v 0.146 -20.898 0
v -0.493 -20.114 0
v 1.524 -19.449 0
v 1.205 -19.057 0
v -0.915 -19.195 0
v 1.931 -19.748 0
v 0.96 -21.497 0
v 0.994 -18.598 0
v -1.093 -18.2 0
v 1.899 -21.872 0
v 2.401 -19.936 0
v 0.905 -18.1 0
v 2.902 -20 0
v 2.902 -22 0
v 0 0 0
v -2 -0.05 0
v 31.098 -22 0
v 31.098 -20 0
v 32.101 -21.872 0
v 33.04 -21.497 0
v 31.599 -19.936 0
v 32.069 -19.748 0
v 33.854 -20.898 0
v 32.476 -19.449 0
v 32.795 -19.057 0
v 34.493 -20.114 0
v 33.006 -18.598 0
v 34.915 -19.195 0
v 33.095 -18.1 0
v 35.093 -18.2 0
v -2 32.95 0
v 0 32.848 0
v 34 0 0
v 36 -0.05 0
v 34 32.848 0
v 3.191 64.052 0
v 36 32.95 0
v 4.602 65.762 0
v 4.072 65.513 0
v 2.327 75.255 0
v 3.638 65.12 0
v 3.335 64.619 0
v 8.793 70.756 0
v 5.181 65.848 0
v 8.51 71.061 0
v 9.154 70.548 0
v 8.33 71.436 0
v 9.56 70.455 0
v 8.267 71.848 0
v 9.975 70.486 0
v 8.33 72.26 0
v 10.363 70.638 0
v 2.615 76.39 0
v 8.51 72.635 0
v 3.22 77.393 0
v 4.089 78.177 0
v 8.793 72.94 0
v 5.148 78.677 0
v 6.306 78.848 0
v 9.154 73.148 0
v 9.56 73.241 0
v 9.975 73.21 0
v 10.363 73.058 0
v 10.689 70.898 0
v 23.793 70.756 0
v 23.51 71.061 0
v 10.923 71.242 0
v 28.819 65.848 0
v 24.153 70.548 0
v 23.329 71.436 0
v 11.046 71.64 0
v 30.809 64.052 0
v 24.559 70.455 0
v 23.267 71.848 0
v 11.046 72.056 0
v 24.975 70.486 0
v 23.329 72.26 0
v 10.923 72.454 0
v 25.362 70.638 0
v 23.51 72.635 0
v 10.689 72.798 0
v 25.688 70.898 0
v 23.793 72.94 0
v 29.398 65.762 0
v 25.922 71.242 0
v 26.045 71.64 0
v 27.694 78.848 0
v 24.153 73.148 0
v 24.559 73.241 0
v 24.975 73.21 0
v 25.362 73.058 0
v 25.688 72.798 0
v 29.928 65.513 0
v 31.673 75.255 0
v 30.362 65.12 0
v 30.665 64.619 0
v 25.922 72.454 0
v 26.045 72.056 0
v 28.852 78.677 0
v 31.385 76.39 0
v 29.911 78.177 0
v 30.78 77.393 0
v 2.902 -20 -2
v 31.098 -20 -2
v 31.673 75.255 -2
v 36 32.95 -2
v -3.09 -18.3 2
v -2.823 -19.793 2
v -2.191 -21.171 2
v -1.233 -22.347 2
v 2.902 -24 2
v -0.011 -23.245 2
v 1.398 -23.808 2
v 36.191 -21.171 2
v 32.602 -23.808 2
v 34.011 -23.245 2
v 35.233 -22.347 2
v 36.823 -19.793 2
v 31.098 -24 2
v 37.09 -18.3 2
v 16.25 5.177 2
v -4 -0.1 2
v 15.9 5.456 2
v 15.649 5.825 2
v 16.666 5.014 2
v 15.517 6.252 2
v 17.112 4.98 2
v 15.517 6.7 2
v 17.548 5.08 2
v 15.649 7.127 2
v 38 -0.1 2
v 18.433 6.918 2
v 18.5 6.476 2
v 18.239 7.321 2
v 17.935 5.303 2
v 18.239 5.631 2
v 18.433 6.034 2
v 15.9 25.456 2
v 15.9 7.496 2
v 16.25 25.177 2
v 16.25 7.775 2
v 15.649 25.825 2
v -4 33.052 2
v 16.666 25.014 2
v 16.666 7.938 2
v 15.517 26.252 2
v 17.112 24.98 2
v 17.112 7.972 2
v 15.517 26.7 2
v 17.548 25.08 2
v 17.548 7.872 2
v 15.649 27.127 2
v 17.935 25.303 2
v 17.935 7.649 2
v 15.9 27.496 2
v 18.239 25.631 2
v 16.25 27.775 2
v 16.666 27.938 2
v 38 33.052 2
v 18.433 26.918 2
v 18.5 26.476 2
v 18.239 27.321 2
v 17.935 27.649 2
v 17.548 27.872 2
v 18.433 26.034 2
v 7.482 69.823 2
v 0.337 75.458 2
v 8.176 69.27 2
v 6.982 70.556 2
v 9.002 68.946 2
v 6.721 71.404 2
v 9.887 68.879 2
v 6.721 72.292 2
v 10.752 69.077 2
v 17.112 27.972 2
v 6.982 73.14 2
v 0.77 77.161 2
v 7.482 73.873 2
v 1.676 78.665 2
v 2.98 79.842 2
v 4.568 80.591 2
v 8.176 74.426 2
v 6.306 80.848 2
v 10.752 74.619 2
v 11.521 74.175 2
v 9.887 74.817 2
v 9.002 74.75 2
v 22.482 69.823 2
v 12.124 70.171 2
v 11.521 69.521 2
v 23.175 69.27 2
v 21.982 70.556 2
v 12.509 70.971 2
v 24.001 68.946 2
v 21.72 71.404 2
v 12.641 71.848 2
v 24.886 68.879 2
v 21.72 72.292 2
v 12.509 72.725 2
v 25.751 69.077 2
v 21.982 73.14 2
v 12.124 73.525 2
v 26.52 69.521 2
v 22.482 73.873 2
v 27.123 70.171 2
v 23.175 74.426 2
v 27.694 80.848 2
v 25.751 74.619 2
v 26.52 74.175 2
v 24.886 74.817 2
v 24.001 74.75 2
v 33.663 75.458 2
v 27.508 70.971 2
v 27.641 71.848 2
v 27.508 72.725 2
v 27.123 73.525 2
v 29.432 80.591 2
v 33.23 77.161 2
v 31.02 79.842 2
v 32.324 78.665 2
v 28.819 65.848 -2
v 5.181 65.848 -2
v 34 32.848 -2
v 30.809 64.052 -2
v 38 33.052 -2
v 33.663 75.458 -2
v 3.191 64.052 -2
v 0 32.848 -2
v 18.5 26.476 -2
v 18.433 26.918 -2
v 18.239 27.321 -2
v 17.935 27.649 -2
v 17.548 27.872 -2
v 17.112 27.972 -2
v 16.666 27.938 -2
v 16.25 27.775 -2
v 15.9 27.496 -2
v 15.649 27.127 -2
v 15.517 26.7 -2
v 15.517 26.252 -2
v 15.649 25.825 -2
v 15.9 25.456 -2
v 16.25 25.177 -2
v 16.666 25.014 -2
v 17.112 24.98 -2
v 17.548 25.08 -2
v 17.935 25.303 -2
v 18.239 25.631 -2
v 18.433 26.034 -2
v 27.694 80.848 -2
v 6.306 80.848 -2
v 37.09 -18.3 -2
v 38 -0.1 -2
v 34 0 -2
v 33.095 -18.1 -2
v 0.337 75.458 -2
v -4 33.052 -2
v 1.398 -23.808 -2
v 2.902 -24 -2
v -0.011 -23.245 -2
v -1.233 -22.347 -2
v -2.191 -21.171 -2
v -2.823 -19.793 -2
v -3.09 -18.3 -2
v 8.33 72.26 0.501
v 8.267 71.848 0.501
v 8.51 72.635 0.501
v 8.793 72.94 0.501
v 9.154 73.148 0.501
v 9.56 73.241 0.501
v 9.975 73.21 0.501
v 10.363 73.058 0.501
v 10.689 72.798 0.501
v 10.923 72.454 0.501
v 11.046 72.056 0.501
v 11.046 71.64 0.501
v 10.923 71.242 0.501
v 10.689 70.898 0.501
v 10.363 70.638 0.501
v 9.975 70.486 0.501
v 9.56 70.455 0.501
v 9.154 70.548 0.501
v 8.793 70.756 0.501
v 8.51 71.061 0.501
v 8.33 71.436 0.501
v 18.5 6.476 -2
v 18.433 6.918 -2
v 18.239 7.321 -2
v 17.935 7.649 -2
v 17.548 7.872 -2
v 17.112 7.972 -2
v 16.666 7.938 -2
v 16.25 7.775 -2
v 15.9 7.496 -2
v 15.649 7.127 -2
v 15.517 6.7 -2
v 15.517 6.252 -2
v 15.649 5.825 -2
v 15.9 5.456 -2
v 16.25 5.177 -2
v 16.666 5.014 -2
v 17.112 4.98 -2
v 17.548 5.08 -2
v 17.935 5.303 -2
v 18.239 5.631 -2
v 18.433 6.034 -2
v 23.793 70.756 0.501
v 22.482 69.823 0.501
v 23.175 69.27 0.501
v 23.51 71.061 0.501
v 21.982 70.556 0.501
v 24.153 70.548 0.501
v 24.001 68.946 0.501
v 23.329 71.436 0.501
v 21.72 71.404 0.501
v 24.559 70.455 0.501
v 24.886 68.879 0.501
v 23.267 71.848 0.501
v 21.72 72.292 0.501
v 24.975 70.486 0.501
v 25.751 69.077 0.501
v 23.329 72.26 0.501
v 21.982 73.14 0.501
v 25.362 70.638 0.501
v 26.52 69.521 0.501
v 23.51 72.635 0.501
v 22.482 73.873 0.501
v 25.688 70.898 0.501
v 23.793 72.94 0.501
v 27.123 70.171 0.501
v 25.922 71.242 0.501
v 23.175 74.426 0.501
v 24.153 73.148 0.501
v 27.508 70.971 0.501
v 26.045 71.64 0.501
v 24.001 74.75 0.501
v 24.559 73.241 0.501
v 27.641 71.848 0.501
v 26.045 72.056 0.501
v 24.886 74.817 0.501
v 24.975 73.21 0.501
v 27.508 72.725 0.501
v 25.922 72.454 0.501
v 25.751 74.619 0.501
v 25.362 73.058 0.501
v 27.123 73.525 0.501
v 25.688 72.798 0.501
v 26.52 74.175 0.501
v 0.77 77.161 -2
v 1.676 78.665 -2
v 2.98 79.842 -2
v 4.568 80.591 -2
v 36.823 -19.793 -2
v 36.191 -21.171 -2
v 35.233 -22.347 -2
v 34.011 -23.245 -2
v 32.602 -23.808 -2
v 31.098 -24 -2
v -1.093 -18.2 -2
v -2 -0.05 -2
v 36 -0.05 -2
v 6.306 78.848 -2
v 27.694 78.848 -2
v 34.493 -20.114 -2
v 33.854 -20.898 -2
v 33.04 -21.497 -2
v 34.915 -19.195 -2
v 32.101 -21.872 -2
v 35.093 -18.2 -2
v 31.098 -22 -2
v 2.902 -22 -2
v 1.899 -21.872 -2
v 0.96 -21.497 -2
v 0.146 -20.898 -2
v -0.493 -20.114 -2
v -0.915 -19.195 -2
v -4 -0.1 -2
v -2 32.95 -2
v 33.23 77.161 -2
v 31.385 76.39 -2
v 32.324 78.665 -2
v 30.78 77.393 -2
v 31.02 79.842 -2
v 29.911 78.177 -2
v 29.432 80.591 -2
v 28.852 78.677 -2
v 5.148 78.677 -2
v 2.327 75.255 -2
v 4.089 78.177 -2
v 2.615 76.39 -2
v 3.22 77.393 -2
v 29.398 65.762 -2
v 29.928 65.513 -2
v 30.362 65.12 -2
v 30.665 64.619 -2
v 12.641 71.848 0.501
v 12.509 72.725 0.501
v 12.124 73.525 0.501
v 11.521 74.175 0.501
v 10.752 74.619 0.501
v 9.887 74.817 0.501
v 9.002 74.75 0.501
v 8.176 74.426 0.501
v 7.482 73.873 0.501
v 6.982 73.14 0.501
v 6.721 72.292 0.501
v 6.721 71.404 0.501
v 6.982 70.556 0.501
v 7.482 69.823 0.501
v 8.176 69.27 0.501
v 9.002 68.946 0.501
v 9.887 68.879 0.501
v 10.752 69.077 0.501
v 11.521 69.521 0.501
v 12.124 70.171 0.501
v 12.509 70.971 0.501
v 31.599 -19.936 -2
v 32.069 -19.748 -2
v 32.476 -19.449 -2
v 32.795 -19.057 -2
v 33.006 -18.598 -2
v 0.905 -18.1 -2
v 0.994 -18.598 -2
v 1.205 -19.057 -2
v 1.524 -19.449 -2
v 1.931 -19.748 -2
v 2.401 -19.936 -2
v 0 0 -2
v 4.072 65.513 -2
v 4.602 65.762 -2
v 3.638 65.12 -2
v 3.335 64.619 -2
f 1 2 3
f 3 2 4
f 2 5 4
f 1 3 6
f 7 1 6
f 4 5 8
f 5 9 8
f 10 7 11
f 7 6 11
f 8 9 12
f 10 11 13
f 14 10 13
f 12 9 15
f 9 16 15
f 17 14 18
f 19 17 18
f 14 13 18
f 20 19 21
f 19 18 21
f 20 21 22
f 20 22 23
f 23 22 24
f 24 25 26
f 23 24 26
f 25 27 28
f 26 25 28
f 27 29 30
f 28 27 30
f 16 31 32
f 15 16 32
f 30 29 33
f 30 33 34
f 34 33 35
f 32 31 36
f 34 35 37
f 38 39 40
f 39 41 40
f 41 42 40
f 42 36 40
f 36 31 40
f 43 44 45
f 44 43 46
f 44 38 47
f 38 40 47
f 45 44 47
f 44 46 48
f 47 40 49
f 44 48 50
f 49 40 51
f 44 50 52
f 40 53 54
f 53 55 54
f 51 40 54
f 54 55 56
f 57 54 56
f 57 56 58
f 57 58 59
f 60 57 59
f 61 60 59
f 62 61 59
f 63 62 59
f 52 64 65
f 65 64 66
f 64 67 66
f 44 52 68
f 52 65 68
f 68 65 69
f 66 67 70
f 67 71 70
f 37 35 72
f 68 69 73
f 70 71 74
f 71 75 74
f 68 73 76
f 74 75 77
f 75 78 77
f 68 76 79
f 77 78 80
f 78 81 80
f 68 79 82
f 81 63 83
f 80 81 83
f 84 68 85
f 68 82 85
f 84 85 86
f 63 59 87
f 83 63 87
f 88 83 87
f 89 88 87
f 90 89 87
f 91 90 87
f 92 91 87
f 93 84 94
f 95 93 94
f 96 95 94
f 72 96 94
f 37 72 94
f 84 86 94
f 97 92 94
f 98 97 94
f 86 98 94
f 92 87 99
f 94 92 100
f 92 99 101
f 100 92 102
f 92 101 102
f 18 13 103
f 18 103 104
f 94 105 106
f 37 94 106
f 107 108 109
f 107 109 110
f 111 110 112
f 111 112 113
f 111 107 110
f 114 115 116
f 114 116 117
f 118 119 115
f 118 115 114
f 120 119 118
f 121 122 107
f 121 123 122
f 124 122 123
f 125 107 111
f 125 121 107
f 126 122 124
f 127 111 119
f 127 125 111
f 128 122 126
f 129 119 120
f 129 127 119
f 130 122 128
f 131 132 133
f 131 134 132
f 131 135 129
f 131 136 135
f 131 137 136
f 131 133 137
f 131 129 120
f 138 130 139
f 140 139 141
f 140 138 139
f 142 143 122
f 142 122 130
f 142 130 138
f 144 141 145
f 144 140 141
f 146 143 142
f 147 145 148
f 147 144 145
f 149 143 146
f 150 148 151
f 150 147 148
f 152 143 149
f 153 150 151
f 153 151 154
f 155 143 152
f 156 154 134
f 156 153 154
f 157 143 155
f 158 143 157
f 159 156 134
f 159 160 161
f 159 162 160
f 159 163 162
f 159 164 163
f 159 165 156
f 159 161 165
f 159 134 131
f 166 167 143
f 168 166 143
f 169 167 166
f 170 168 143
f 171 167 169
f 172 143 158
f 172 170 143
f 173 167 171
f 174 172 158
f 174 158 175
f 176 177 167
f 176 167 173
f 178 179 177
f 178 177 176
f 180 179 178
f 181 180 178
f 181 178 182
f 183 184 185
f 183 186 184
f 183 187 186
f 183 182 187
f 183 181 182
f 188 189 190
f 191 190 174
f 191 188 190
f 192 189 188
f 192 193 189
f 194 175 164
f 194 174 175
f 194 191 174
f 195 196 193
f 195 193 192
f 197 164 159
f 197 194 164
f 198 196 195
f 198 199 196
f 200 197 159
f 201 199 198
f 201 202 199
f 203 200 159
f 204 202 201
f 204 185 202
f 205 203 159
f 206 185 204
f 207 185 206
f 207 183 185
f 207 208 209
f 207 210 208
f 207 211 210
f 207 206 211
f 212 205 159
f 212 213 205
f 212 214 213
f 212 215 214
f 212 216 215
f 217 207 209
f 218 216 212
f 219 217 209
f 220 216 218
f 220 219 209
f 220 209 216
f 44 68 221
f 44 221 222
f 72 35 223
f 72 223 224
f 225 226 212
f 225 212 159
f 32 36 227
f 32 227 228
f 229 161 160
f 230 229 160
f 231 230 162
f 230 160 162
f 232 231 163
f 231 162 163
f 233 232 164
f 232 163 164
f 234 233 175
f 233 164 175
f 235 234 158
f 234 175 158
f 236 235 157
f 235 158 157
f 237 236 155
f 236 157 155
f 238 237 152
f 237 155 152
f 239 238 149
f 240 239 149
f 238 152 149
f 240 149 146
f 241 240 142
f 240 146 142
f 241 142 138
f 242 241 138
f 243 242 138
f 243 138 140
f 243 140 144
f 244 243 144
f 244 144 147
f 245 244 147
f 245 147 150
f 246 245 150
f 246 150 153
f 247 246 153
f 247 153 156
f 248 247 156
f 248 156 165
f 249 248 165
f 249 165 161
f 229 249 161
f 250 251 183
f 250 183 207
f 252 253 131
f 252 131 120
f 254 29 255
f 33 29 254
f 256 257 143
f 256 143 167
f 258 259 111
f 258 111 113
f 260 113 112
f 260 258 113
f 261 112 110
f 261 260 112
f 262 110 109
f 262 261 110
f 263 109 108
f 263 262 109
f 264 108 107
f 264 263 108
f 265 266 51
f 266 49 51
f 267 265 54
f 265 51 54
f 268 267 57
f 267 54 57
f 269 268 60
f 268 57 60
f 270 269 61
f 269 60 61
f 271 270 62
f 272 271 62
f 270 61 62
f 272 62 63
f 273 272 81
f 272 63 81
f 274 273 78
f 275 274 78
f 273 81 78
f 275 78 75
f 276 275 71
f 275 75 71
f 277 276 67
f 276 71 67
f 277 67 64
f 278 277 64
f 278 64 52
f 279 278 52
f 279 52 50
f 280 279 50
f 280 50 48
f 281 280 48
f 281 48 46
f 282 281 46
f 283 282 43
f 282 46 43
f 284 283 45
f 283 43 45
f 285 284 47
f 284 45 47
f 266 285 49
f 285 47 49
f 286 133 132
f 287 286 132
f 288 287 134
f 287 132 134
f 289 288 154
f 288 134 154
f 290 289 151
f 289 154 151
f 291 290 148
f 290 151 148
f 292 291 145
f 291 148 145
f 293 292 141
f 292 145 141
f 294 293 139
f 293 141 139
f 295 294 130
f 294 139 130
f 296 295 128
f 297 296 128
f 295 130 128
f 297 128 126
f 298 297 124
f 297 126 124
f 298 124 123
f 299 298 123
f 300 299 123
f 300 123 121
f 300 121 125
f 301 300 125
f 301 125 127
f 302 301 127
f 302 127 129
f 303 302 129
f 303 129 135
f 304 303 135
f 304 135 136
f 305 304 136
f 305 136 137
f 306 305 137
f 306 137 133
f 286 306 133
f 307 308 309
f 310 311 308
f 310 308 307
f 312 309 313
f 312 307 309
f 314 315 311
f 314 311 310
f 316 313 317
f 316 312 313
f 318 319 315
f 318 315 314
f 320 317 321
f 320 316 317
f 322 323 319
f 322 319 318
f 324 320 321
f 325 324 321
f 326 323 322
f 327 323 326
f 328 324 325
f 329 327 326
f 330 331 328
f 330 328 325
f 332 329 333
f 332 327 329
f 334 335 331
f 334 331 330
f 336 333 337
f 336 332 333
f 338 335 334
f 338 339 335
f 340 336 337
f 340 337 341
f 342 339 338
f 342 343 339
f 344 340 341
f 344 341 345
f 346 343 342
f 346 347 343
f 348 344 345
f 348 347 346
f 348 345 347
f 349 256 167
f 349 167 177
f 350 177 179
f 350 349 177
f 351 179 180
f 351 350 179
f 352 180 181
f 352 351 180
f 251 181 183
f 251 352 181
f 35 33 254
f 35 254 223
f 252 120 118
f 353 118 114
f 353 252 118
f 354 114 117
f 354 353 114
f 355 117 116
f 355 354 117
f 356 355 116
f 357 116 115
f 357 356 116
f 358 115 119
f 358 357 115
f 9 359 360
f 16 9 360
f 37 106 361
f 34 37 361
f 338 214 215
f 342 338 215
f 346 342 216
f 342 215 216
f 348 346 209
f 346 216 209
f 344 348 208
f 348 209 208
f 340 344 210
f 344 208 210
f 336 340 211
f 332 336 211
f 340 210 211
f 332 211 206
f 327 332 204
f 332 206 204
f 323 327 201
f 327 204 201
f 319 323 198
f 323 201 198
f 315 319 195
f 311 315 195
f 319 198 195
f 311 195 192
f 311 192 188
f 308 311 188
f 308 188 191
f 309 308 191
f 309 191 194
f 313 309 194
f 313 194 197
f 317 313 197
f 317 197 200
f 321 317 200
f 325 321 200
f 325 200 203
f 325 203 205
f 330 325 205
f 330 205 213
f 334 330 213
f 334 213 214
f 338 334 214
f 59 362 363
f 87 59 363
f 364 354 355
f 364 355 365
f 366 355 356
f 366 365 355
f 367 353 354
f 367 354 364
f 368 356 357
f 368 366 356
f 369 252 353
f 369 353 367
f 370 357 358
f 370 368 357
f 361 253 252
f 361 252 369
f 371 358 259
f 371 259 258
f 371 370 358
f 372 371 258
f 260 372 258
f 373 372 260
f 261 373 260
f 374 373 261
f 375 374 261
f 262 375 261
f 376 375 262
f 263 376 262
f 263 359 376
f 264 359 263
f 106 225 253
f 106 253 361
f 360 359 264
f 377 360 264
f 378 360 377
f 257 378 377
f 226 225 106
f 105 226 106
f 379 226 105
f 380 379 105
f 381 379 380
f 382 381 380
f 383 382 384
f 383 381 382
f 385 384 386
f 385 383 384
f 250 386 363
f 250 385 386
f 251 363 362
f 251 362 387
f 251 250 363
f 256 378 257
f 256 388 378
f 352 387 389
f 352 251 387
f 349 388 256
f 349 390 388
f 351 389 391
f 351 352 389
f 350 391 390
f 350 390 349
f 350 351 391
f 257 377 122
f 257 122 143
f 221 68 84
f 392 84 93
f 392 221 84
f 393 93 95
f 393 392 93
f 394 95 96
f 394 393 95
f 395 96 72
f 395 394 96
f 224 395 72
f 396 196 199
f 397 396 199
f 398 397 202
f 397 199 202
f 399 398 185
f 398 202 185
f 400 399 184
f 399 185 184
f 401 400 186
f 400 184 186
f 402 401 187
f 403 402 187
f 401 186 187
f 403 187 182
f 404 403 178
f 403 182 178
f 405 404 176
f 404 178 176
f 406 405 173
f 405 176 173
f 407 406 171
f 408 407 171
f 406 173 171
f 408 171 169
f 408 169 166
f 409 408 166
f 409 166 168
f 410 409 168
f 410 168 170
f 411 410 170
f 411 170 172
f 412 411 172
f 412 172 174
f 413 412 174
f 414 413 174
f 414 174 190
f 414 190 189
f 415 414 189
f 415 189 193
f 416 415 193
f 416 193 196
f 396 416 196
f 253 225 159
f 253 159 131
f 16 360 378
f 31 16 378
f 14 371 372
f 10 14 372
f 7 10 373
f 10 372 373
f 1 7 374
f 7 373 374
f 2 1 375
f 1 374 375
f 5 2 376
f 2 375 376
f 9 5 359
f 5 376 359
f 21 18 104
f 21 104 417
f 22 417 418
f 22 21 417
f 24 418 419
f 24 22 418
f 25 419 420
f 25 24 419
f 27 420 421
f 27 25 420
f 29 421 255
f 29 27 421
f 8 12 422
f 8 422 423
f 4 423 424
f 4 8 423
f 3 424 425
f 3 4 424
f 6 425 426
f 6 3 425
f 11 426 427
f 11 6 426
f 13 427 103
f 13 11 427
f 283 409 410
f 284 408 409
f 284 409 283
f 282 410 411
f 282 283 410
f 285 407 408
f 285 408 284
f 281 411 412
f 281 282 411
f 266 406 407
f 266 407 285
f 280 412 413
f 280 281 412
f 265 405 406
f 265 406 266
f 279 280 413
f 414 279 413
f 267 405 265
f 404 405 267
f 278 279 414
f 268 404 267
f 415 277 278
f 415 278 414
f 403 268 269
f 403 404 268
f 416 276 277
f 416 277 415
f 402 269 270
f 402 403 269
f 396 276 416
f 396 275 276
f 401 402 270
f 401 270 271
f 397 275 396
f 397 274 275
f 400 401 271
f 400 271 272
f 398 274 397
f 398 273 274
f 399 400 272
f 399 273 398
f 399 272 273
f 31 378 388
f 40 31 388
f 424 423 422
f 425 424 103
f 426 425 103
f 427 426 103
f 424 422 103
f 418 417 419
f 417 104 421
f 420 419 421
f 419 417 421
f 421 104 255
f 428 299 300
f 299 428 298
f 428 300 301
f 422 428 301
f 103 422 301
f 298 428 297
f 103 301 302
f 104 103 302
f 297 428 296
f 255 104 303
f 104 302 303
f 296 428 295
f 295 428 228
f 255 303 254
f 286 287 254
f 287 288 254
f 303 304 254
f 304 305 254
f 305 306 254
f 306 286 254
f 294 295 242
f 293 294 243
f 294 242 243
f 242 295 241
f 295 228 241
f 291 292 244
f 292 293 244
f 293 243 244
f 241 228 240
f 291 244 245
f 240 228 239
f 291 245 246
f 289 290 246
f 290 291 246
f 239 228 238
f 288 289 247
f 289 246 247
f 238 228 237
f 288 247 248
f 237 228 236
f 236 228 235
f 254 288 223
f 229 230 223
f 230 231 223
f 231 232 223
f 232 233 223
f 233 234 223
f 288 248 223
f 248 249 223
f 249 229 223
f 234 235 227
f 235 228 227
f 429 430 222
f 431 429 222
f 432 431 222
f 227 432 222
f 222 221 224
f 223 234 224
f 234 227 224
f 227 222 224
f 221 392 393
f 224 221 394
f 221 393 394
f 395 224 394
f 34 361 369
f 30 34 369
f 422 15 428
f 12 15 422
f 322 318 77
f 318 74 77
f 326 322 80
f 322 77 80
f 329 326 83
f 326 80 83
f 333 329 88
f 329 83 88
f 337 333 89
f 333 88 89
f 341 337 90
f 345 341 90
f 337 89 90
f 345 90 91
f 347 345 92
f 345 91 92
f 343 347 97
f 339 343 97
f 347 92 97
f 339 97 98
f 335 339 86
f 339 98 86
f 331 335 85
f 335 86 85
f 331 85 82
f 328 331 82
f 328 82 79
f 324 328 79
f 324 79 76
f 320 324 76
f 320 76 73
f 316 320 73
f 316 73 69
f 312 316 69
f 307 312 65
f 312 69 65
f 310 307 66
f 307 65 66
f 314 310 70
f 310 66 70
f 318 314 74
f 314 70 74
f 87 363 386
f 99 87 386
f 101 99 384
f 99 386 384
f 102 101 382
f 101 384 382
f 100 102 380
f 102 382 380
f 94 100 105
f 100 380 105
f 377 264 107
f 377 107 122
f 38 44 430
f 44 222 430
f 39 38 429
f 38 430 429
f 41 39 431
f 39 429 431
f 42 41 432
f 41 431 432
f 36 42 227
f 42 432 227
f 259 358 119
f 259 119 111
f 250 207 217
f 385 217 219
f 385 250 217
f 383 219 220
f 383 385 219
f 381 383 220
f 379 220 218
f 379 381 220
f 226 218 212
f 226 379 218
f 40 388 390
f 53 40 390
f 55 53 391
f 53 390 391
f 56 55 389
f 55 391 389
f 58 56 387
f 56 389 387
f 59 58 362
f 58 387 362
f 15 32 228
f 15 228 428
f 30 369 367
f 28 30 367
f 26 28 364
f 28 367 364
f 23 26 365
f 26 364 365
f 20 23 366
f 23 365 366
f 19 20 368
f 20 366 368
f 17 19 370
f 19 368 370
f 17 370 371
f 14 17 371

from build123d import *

# Parameters (mm, degrees)
BOSS_EXTRUDE4_DEPTH                                 = 2
BOSS_EXTRUDE5_START                                 = 2
BOSS_EXTRUDE5_DEPTH                                 = 2
BOSS_EXTRUDE6_DEPTH                                 = 2
FILLET1_R                                           = 2
CBORE_FOR_3_BINDING_HEAD_MACHINE_SCREW1_D           = 2.794
CBORE_FOR_3_BINDING_HEAD_MACHINE_SCREW1_CBORE_D     = 5.95376
CBORE_FOR_3_BINDING_HEAD_MACHINE_SCREW1_CBORE_DEPTH = 1.4986
SKETCH10_R                                          = 1.5
CUT_EXTRUDE1_DEPTH                                  = 5
SKETCH9_R                                           = 1.5
CUT_EXTRUDE2_DEPTH                                  = 5


with BuildPart() as part:
    # Sketch1 → Boss-Extrude4 (new body)
    with BuildSketch(Plane.XY):
        with BuildLine():
            Line((37.090015594, -18.299625702), (38, -0.099937578))
            Line((38, -0.099937578), (38, 33.052037892))
            Line((38, 33.052037892), (33.662977857, 75.458476622))
            ThreePointArc((33.662977857, 75.458476622), (31.715138161, 79.301265628), (27.694112953, 80.84802453))
            Line((27.694112953, 80.84802453), (6.305887047, 80.84802453))
            ThreePointArc((6.305887047, 80.84802453), (2.284861839, 79.301265628), (0.337022143, 75.458476622))
            Line((0.337022143, 75.458476622), (-4, 33.052037892))
            Line((-4, 33.052037892), (-4, -0.099937578))
            Line((-4, -0.099937578), (-3.090015594, -18.299625702))
            ThreePointArc((-3.090015594, -18.299625702), (-1.232851956, -22.347283877), (2.902498439, -24))
            Line((2.902498439, -24), (31.097501561, -24))
            ThreePointArc((31.097501561, -24), (35.232851956, -22.347283877), (37.090015594, -18.299625702))
        make_face()
    extrude(amount=BOSS_EXTRUDE4_DEPTH)

    # Sketch5 → Boss-Extrude5 (add)
    with BuildSketch(Plane(origin=(0, 0, 0), x_dir=(-1, 0, 0), z_dir=(0, 0, -1)).offset(BOSS_EXTRUDE5_START)):
        with BuildLine():
            Line((-33.662977857, 75.458476622), (-38, 33.052037892))
            Line((-38, 33.052037892), (-38, -0.099937578))
            Line((-38, -0.099937578), (-37.090015594, -18.299625702))
            ThreePointArc((-37.090015594, -18.299625702), (-35.232851956, -22.347283877), (-31.097501561, -24))
            Line((-31.097501561, -24), (-2.902498439, -24))
            ThreePointArc((-2.902498439, -24), (1.232851956, -22.347283877), (3.090015594, -18.299625702))
            Line((3.090015594, -18.299625702), (4, -0.099937578))
            Line((4, -0.099937578), (4, 33.052037892))
            Line((4, 33.052037892), (-0.337022143, 75.458476622))
            ThreePointArc((-0.337022143, 75.458476622), (-2.284861839, 79.301265628), (-6.305887047, 80.84802453))
            Line((-6.305887047, 80.84802453), (-27.694112953, 80.84802453))
            ThreePointArc((-27.694112953, 80.84802453), (-31.715138161, 79.301265628), (-33.662977857, 75.458476622))
        make_face()
        with BuildLine():
            Line((-31.097501561, -22), (-2.902498439, -22))
            ThreePointArc((-2.902498439, -22), (-0.145598176, -20.898189251), (1.092510916, -18.199750468))
            Line((1.092510916, -18.199750468), (2, -0.049968789))
            Line((2, -0.049968789), (2, 32.950031211))
            Line((2, 32.950031211), (-2.326643778, 75.254992592))
            ThreePointArc((-2.326643778, 75.254992592), (-3.625203575, 77.816851929), (-6.305887047, 78.84802453))
            Line((-6.305887047, 78.84802453), (-27.694112953, 78.84802453))
            ThreePointArc((-27.694112953, 78.84802453), (-30.374796425, 77.816851929), (-31.673356222, 75.254992592))
            Line((-31.673356222, 75.254992592), (-36, 32.950031211))
            Line((-36, 32.950031211), (-36, -0.049968789))
            Line((-36, -0.049968789), (-35.092510916, -18.199750468))
            ThreePointArc((-35.092510916, -18.199750468), (-33.854401824, -20.898189251), (-31.097501561, -22))
        make_face(mode=Mode.SUBTRACT)
    extrude(amount=-BOSS_EXTRUDE5_DEPTH)

    # Sketch6 → Boss-Extrude6 (add)
    with BuildSketch(Plane(origin=(0, 0, 0), x_dir=(-1, 0, 0), z_dir=(0, 0, -1))):
        with BuildLine():
            Line((-30.625, 65.84802453), (-3.375, 65.84802453))
            Line((-3.375, 65.84802453), (0, 32.84802453))
            Line((0, 32.84802453), (0, 0))
            Line((0, 0), (-0.904993762, -18.099875234))
            ThreePointArc((-0.904993762, -18.099875234), (-1.524048308, -19.449094626), (-2.902498439, -20))
            Line((-2.902498439, -20), (-31.097501561, -20))
            ThreePointArc((-31.097501561, -20), (-32.475951692, -19.449094626), (-33.095006238, -18.099875234))
            Line((-33.095006238, -18.099875234), (-34, 0))
            Line((-34, 0), (-34, 32.84802453))
            Line((-34, 32.84802453), (-30.625, 65.84802453))
        make_face()
    extrude(amount=BOSS_EXTRUDE6_DEPTH)

    # Fillet1
    fillet1_edges = [part.edges().sort_by_distance(p)[0] for p in [
        (30.625, 65.84802453, -1),
        (3.375, 65.84802453, -1),
    ]]
    fillet(fillet1_edges, radius=FILLET1_R)

    # CBORE for #3 Binding Head Machine Screw1 (through all)
    with Locations(Plane.XY.offset(2)):
        with Locations((24.663824929, 71.84802453), (9.664488304, 71.84802453)):
            CounterBoreHole(CBORE_FOR_3_BINDING_HEAD_MACHINE_SCREW1_D / 2, CBORE_FOR_3_BINDING_HEAD_MACHINE_SCREW1_CBORE_D / 2, CBORE_FOR_3_BINDING_HEAD_MACHINE_SCREW1_CBORE_DEPTH)

    # Sketch10 → Cut-Extrude1 (cut)
    with BuildSketch(Plane.XY.offset(2)):
        with Locations((17, 6.476050157)):
            Circle(SKETCH10_R)
    extrude(amount=-CUT_EXTRUDE1_DEPTH, mode=Mode.SUBTRACT)

    # Sketch9 → Cut-Extrude2 (cut)
    with BuildSketch(Plane.XY.offset(2)):
        with Locations((17, 6.476050157)):
            Circle(SKETCH9_R)
        with Locations((17, 26.476050157)):
            Circle(SKETCH9_R)
    extrude(amount=-CUT_EXTRUDE2_DEPTH, mode=Mode.SUBTRACT)


solid = part.part
